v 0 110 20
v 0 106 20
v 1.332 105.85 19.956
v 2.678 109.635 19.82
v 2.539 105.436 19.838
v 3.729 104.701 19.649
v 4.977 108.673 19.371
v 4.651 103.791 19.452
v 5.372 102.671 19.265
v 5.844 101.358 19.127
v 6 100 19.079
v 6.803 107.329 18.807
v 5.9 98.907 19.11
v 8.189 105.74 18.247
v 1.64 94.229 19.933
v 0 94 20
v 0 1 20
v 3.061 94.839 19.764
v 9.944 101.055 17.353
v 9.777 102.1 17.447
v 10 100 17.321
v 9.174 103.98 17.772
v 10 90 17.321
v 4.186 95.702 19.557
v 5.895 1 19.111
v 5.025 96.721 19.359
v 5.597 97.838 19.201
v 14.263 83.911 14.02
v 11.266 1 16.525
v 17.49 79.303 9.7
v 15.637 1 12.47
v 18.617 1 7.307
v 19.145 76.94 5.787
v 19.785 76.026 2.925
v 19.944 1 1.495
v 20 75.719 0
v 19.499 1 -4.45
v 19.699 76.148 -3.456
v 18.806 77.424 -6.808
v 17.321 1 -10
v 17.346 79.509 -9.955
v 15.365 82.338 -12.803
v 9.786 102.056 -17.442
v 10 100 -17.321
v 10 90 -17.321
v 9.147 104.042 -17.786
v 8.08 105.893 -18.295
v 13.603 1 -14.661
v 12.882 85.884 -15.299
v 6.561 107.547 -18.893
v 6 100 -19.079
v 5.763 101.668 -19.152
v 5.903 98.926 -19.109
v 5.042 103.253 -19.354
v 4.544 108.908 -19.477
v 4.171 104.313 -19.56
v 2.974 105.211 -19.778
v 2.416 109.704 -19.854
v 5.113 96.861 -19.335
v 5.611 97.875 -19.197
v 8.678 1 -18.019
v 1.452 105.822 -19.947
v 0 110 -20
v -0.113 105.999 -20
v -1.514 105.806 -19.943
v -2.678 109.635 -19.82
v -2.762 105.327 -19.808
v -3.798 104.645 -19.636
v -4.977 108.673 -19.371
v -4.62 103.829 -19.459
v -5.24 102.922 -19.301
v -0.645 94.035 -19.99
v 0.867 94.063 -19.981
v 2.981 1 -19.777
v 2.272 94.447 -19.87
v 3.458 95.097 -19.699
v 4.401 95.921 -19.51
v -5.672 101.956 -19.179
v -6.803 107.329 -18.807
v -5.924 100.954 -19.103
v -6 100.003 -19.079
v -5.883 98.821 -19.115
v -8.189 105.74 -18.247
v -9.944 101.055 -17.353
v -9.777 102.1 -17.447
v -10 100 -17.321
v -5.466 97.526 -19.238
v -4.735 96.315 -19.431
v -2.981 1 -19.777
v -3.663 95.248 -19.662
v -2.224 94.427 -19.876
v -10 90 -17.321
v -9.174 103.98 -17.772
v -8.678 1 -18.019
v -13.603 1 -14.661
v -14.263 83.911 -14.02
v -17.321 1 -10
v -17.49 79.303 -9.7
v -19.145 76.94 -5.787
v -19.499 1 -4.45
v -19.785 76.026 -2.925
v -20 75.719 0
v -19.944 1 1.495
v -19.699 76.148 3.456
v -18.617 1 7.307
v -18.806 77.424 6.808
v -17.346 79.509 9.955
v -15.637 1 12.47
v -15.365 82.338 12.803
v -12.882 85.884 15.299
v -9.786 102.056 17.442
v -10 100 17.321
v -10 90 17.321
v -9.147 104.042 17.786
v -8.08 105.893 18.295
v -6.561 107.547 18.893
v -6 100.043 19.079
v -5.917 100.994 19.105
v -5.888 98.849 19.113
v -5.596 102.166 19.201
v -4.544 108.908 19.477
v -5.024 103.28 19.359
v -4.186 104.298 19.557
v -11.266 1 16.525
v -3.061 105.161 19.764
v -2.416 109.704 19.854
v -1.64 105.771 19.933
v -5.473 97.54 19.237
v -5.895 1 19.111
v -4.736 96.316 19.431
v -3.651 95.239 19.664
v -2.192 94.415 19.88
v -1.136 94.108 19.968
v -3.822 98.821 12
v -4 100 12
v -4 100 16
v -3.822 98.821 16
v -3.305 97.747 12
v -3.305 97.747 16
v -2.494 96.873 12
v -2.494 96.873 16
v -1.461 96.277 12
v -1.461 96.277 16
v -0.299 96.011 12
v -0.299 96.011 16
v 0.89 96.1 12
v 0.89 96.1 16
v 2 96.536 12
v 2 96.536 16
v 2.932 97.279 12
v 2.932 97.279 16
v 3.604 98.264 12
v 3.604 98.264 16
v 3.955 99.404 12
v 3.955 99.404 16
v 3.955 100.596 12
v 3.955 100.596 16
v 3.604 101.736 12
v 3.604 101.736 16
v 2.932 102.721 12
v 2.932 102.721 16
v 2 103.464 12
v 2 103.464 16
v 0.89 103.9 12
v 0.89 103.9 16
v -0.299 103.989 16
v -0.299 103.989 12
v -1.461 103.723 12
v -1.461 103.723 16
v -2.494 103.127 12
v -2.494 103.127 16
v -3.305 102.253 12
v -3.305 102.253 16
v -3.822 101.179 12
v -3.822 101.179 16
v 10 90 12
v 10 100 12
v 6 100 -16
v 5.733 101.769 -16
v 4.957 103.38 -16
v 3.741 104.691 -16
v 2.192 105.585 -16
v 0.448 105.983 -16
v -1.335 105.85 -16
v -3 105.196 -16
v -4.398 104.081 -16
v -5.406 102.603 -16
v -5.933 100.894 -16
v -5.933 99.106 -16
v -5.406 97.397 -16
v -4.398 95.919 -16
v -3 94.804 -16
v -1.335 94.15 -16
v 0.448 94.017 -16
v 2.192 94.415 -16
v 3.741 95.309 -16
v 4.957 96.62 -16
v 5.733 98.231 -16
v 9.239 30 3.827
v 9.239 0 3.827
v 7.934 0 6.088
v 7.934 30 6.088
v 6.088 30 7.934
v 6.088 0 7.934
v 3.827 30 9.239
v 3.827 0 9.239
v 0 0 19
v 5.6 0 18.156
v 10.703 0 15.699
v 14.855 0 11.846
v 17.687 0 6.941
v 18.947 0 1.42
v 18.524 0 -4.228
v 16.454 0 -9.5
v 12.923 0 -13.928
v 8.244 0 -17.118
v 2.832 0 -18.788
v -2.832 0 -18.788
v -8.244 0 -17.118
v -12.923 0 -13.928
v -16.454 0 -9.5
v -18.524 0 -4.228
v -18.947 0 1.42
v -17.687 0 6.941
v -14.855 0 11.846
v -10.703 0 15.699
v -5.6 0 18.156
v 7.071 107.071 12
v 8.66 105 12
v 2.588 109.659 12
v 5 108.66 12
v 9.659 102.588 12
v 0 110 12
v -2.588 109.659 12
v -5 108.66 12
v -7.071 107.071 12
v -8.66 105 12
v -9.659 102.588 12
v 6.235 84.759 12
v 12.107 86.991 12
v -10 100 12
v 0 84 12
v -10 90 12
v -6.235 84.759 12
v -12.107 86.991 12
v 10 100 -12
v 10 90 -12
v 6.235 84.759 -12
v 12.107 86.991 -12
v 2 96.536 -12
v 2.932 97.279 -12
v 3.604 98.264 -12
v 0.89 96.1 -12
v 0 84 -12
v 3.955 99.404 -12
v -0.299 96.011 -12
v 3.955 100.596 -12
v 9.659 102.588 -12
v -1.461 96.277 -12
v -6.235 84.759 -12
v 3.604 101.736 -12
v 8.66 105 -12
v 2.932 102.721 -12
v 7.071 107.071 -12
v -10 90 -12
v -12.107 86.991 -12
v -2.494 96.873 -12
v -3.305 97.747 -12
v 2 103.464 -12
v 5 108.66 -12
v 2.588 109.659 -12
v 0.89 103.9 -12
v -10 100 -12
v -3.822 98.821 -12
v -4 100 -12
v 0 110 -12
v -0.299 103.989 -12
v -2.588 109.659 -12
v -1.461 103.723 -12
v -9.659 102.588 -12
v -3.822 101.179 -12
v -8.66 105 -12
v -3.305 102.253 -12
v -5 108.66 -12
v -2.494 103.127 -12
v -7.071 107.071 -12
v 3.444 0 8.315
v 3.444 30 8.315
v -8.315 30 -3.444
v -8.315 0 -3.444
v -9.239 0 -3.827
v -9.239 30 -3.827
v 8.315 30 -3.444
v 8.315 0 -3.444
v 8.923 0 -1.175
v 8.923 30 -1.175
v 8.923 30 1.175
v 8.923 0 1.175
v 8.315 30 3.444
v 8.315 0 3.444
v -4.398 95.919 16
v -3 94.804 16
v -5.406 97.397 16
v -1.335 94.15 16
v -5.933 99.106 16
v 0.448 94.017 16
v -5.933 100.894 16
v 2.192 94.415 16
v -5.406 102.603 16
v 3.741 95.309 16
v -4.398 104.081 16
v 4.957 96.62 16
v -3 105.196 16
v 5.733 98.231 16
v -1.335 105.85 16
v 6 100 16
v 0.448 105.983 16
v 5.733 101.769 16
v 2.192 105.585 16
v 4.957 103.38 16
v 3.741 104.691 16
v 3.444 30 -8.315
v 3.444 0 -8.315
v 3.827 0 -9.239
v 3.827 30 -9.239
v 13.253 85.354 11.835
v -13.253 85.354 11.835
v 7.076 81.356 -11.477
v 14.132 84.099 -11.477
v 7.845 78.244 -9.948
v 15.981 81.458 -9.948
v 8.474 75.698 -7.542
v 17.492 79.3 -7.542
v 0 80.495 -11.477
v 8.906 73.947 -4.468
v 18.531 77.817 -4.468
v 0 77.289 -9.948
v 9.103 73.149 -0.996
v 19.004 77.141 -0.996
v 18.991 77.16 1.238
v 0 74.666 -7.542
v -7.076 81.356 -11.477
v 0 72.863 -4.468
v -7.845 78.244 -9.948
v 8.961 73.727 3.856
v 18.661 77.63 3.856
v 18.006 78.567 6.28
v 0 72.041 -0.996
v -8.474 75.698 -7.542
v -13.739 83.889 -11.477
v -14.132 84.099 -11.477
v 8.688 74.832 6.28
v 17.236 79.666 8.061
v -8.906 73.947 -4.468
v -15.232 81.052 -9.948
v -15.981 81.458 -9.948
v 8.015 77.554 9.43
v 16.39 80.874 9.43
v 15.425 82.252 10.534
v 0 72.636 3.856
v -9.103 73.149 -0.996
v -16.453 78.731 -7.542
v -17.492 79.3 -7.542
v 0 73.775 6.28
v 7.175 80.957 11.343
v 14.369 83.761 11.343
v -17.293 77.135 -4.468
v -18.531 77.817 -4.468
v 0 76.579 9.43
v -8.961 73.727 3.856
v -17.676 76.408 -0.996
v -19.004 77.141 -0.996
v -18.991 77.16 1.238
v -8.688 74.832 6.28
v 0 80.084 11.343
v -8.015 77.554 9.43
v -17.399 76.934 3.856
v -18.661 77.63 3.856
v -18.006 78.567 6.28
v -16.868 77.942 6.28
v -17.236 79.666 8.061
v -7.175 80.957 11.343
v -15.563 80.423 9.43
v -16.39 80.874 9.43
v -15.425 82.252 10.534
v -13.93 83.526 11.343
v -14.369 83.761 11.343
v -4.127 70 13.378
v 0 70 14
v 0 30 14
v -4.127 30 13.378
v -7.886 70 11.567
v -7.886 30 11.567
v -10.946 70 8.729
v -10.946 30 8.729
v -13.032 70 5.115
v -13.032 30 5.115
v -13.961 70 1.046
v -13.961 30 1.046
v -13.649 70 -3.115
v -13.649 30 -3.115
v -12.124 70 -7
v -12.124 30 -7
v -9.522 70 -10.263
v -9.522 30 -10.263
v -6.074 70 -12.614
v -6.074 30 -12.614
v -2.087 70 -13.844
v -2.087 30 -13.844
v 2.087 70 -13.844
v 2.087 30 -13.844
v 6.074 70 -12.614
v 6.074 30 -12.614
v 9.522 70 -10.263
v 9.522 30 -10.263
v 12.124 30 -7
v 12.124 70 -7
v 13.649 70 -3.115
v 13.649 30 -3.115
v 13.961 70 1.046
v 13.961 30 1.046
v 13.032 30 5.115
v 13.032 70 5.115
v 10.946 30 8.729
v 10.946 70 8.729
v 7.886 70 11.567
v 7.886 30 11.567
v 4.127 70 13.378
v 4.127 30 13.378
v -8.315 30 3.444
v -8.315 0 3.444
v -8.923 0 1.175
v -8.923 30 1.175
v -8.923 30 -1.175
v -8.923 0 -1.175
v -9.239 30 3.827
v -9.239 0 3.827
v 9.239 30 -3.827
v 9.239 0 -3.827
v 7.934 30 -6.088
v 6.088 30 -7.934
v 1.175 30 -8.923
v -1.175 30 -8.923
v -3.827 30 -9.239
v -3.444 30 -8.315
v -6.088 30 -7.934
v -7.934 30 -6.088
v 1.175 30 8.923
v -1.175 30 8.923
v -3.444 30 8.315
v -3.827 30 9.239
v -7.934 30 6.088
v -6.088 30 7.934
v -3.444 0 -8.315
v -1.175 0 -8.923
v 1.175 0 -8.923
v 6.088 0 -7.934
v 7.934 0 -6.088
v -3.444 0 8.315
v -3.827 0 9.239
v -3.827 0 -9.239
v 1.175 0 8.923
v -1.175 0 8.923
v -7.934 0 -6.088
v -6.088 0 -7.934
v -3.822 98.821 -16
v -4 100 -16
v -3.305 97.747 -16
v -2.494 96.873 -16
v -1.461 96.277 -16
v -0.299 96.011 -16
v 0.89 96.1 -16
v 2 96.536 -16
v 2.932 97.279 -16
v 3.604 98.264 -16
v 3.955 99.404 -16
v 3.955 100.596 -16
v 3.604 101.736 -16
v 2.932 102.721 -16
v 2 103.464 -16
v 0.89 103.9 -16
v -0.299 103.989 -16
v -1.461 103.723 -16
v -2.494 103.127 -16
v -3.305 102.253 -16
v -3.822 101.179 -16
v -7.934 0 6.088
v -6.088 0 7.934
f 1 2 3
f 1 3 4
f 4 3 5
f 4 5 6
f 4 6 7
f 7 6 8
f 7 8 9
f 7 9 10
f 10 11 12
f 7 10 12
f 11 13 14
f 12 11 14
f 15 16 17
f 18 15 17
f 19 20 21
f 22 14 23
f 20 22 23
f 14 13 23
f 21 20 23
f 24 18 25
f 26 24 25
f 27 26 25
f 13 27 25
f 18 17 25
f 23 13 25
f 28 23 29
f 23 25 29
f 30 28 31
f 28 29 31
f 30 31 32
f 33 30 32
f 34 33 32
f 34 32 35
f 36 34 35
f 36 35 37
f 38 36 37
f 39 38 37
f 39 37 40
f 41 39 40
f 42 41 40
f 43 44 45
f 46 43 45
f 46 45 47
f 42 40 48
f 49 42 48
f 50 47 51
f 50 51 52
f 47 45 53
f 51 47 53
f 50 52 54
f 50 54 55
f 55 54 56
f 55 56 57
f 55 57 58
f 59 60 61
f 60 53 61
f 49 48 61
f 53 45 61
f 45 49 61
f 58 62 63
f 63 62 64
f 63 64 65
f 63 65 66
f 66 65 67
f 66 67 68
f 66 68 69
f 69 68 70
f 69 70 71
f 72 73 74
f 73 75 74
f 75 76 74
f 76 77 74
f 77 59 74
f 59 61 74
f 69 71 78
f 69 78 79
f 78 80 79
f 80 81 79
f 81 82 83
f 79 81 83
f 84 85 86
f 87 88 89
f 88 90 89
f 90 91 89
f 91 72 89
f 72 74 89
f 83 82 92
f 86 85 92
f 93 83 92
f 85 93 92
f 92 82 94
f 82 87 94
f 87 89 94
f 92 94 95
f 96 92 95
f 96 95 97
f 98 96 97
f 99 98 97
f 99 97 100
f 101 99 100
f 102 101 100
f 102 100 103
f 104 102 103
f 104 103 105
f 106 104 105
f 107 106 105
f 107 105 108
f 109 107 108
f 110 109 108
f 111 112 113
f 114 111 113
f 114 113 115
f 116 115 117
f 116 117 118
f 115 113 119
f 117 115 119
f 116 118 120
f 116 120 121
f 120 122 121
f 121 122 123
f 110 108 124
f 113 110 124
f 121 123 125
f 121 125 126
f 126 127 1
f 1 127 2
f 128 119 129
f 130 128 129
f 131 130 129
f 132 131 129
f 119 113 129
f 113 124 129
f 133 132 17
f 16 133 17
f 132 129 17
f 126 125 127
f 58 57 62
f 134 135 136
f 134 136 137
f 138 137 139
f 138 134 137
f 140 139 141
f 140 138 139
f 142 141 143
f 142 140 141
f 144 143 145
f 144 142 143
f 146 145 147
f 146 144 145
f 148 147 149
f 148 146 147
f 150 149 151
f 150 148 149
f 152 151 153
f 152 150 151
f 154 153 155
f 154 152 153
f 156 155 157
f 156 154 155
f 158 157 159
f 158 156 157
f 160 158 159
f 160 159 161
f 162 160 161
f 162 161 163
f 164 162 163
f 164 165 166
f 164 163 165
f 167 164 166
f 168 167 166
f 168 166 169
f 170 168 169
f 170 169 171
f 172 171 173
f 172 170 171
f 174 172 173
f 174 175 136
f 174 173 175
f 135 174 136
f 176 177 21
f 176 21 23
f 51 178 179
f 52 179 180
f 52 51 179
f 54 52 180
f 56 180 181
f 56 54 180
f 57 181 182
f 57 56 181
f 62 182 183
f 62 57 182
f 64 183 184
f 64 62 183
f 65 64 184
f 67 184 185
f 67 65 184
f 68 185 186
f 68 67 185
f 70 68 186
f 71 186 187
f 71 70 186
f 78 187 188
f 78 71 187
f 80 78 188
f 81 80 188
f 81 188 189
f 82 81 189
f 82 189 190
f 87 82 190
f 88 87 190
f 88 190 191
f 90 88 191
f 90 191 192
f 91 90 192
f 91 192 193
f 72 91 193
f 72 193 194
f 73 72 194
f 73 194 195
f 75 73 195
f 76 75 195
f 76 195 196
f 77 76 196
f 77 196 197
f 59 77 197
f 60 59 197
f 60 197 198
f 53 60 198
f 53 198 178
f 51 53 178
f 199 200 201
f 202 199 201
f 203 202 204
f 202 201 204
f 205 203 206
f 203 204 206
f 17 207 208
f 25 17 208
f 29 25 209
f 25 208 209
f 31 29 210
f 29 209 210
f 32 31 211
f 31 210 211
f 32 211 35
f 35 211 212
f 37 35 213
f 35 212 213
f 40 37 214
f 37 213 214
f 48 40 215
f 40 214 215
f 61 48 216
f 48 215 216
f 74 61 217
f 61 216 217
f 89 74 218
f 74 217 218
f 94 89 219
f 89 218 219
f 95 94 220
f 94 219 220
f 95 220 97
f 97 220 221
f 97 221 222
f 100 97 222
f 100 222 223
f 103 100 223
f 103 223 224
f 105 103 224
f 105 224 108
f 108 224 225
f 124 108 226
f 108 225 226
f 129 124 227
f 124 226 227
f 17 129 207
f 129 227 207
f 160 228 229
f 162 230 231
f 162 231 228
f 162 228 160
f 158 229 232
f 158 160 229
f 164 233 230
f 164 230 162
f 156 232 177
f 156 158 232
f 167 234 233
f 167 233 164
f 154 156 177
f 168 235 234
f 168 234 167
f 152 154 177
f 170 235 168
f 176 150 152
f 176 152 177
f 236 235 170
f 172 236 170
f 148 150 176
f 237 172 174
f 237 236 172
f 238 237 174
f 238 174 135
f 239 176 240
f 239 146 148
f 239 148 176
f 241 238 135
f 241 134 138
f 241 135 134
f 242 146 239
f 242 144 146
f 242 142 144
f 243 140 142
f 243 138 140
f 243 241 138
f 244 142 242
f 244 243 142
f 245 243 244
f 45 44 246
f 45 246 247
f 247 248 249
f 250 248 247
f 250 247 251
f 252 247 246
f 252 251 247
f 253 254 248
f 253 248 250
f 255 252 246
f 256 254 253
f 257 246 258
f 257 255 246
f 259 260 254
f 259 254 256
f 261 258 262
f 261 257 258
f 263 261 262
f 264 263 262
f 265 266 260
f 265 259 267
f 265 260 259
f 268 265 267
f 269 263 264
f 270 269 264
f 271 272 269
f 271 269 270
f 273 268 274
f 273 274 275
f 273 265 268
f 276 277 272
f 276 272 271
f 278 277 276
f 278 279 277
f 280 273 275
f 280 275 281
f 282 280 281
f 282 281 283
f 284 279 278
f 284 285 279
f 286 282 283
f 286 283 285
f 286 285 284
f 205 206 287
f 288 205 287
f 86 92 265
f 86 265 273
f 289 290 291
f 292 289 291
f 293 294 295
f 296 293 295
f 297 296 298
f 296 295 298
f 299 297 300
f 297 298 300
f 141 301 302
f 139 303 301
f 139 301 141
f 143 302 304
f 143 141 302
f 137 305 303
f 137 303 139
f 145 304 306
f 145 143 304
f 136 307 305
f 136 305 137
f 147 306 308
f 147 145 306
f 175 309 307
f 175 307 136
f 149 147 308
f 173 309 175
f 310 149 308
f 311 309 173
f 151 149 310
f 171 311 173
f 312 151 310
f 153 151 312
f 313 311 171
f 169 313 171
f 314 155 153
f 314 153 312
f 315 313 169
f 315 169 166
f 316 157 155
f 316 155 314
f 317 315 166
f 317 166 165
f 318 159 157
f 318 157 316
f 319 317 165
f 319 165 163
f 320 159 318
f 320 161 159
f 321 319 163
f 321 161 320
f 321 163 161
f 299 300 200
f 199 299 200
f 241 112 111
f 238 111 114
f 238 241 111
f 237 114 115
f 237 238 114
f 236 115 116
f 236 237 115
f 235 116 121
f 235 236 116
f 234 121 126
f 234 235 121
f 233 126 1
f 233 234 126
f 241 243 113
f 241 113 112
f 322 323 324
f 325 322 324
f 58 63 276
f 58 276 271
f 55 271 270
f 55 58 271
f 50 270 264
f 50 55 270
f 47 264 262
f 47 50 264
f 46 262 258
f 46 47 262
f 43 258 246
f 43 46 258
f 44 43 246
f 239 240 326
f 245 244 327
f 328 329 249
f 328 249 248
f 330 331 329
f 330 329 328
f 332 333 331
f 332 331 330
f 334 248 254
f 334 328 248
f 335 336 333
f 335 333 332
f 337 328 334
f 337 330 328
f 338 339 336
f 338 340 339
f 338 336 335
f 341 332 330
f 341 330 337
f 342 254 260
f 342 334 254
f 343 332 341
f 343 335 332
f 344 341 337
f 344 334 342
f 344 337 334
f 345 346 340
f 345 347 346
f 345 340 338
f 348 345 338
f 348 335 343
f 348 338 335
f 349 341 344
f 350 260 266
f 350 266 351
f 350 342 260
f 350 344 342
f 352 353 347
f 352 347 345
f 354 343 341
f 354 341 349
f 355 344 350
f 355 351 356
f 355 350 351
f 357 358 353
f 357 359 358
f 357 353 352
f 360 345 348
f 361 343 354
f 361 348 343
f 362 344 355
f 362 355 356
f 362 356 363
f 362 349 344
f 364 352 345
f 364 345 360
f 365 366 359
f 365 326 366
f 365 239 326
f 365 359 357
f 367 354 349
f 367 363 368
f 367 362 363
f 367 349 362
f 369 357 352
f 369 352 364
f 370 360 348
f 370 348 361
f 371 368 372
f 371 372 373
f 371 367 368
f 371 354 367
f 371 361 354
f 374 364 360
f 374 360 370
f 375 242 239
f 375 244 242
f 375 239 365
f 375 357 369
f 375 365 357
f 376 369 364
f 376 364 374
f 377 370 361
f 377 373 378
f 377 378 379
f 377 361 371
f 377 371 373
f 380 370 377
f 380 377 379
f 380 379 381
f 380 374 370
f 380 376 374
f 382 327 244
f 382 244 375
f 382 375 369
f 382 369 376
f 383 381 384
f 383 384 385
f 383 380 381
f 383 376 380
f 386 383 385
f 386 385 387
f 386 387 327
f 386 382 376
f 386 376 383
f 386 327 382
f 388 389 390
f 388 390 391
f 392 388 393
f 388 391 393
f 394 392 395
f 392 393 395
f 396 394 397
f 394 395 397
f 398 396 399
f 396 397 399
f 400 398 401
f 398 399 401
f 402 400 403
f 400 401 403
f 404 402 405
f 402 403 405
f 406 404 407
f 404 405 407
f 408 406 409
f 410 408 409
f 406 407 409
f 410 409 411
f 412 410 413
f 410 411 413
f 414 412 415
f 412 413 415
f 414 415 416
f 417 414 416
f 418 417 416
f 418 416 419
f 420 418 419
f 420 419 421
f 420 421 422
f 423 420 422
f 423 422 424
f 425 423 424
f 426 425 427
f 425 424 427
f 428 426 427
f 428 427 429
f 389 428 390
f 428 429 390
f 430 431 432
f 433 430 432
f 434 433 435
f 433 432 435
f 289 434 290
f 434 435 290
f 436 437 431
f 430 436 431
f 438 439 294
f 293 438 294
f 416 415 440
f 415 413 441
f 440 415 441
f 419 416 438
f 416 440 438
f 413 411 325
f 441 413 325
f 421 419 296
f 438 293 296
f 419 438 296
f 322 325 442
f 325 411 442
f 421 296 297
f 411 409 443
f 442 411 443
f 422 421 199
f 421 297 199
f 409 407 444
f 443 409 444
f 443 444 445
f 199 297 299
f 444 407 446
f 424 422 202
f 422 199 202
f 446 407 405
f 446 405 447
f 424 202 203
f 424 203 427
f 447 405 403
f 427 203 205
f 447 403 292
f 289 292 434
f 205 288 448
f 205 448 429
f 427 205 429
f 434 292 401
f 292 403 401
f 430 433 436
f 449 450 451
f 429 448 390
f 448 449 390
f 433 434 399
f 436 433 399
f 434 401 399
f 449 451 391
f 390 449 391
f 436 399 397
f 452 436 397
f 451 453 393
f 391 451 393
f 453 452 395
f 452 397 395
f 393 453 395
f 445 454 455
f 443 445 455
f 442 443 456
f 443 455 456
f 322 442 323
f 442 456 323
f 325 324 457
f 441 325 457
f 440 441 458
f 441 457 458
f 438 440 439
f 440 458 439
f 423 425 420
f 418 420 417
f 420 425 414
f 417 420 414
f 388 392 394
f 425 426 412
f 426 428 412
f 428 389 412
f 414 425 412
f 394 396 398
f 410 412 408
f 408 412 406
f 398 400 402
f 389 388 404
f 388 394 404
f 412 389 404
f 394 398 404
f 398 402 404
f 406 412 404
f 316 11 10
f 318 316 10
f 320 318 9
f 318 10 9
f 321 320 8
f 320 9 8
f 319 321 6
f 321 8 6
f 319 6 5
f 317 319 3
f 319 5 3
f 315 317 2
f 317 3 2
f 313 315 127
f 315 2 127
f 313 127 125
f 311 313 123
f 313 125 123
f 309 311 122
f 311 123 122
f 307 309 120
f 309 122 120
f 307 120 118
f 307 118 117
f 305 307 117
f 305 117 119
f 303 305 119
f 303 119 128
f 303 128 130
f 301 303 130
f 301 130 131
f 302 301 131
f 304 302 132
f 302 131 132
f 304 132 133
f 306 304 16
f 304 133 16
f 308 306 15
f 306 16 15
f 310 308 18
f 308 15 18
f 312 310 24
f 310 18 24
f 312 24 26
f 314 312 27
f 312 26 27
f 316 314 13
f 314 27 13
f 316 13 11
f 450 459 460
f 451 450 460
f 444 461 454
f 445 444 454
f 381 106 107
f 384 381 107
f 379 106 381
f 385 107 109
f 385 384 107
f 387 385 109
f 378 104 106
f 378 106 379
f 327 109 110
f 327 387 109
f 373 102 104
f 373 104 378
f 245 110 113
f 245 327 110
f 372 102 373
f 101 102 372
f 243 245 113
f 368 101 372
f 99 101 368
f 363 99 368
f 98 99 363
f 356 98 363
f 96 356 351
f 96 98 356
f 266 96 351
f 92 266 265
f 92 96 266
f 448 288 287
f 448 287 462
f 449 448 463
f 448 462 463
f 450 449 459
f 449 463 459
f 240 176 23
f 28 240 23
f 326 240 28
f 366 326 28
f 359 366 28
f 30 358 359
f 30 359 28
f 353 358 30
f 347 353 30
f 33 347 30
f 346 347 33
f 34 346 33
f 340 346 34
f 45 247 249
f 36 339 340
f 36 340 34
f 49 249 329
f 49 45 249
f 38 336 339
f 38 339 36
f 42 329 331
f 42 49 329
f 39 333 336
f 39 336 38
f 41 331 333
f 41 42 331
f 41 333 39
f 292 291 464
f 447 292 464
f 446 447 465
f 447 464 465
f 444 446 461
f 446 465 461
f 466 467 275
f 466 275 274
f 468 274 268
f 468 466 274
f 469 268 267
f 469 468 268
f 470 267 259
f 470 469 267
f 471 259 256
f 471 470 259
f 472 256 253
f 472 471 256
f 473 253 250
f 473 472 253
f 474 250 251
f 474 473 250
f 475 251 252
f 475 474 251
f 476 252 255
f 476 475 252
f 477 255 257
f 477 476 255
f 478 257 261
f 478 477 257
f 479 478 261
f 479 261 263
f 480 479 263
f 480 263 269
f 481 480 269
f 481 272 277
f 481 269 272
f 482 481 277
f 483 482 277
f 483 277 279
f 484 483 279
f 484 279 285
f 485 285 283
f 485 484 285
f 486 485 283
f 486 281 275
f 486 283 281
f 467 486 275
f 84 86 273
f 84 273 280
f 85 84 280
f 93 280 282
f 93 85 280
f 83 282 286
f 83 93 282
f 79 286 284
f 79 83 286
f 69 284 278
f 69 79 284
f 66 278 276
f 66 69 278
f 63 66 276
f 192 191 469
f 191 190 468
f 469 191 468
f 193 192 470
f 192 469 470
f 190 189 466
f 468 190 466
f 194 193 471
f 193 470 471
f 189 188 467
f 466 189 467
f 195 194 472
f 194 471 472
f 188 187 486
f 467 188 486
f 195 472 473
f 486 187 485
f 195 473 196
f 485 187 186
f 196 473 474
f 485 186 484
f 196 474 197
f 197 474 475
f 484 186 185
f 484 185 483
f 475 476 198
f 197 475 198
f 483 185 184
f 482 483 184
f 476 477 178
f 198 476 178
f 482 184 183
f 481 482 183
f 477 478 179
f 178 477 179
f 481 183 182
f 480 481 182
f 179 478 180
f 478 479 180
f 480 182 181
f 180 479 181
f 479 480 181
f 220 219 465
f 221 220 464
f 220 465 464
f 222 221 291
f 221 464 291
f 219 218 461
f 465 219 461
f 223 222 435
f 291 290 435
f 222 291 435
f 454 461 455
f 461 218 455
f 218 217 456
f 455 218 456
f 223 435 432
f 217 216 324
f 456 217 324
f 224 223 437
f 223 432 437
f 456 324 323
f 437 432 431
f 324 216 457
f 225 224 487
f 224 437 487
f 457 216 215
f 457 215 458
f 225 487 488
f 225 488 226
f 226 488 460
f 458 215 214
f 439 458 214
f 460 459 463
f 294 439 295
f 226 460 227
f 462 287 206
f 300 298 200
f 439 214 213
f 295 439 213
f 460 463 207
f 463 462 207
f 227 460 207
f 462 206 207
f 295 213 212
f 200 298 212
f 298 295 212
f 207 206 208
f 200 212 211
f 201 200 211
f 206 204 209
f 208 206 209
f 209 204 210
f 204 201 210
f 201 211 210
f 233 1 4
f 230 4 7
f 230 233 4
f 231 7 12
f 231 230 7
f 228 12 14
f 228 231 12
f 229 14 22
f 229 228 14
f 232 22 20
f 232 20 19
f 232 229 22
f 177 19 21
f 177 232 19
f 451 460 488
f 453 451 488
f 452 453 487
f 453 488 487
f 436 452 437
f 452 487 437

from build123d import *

# Parameters (mm, degrees)
CROQUIS1_R                 = 20
SALIENTE_EXTRUIR1_DEPTH    = 110
CORTAR_EXTRUIR1_DEPTH      = 110
CORTAR_EXTRUIR1_DEPTH_BACK = 110
CORTAR_EXTRUIR2_DEPTH      = 110
CORTAR_EXTRUIR2_DEPTH_BACK = 110
CROQUIS4_R                 = 4
CROQUIS5_R                 = 6
CORTAR_EXTRUIR4_DEPTH      = 4
CORTAR_EXTRUIR5_DEPTH      = 44
CHAFL_N1_SIZE              = 1


with BuildPart() as part:
    # Croquis1 → Saliente-Extruir1 (new body)
    with BuildSketch(Plane(origin=(0, 0, 0), x_dir=(1, 0, 0), z_dir=(0, 1, 0))):
        Circle(CROQUIS1_R)
    extrude(amount=SALIENTE_EXTRUIR1_DEPTH)

    # Croquis2 → Cortar-Extruir1 (cut, two sides: drawn at the far end of the back side and taken through both)
    with BuildSketch(Plane.XY.offset(-CORTAR_EXTRUIR1_DEPTH_BACK)):
        with BuildLine():
            Line((20, 110), (0, 110))
            ThreePointArc((0, 110), (7.071067812, 107.071067812), (10, 100))
            Line((10, 100), (10, 90))
            Line((10, 90), (20, 75.718519933))
            Line((20, 75.718519933), (20, 110))
        make_face()
        with BuildLine():
            Line((-10, 90), (-10, 100))
            ThreePointArc((-10, 100), (-7.071067812, 107.071067812), (0, 110))
            Line((0, 110), (-20, 110))
            Line((-20, 110), (-20, 75.718519933))
            Line((-20, 75.718519933), (-10, 90))
        make_face()
    extrude(amount=CORTAR_EXTRUIR1_DEPTH + CORTAR_EXTRUIR1_DEPTH_BACK, mode=Mode.SUBTRACT)

    # Croquis4 → Cortar-Extruir2 (cut, two sides: drawn at the far end of the back side and taken through both)
    with BuildSketch(Plane.XY.offset(-CORTAR_EXTRUIR2_DEPTH_BACK)):
        with Locations((0, 100)):
            Circle(CROQUIS4_R)
    extrude(amount=CORTAR_EXTRUIR2_DEPTH + CORTAR_EXTRUIR2_DEPTH_BACK, mode=Mode.SUBTRACT)

    # Croquis3 → Cortar-Revolución1 (revolve, cut)
    with BuildSketch(Plane(origin=(0, 0, 0), x_dir=(0, 0, -1), z_dir=(1, 0, 0))):
        with BuildLine():
            Line((-12, 110), (12, 110))
            Line((12, 110), (12, 84))
            ThreePointArc((12, 84), (0, 72), (-12, 84))
            Line((-12, 84), (-12, 110))
        make_face()
    revolve(axis=Axis((0, 110, 12), (0, 0, -1)), mode=Mode.SUBTRACT)

    # Croquis5 → Cortar-Extruir4 (cut)
    with BuildSketch(Plane.XY.offset(20)):
        with Locations((0, 100)):
            Circle(CROQUIS5_R)
    cortar_extruir4 = extrude(amount=-CORTAR_EXTRUIR4_DEPTH, mode=Mode.SUBTRACT)

    # Simetría1: Cortar-Extruir4 across plane
    add(cortar_extruir4.mirror(Plane.XY), mode=Mode.SUBTRACT)

    # Croquis6 → Cortar-Revolución2 (revolve, cut)
    with BuildSketch(Plane.XY):
        Polygon((-9, 0), (0, 0), (0, 70), (-14, 70), (-14, 30), (-9, 30), align=None)
    revolve(axis=Axis((0, 70, 0), (0, -1, 0)), mode=Mode.SUBTRACT)

    # Croquis7 → Cortar-Extruir5 (cut)
    with BuildSketch(Plane.XZ):
        with BuildLine():
            Line((-9.239334584, 3.827057692), (-8.314915793, 3.444150891))
            ThreePointArc((-8.314915793, 3.444150891), (-9, 0), (-8.314915793, -3.444150891))
            Line((-8.314915793, -3.444150891), (-9.239334584, -3.827057692))
            ThreePointArc((-9.239334584, -3.827057692), (-7.071480543, -7.071480543), (-3.827057692, -9.239334584))
            Line((-3.827057692, -9.239334584), (-3.444150891, -8.314915793))
            ThreePointArc((-3.444150891, -8.314915793), (0, -9), (3.444150891, -8.314915793))
            Line((3.444150891, -8.314915793), (3.827057692, -9.239334584))
            ThreePointArc((3.827057692, -9.239334584), (7.071480543, -7.071480543), (9.239334584, -3.827057692))
            Line((9.239334584, -3.827057692), (8.314915793, -3.444150891))
            ThreePointArc((8.314915793, -3.444150891), (9, 0), (8.314915793, 3.444150891))
            Line((8.314915793, 3.444150891), (9.239334584, 3.827057692))
            ThreePointArc((9.239334584, 3.827057692), (7.071480543, 7.071480543), (3.827057692, 9.239334584))
            Line((3.827057692, 9.239334584), (3.444150891, 8.314915793))
            ThreePointArc((3.444150891, 8.314915793), (0, 9), (-3.444150891, 8.314915793))
            Line((-3.444150891, 8.314915793), (-3.827057692, 9.239334584))
            ThreePointArc((-3.827057692, 9.239334584), (-7.071480543, 7.071480543), (-9.239334584, 3.827057692))
        make_face()
    extrude(amount=-CORTAR_EXTRUIR5_DEPTH, mode=Mode.SUBTRACT)

    # Chaflán1
    chafl_n1_edges = [part.edges().sort_by_distance(p)[0] for p in [
        (-20, 0, 0),
    ]]
    chamfer(chafl_n1_edges, length=CHAFL_N1_SIZE)


solid = part.part
